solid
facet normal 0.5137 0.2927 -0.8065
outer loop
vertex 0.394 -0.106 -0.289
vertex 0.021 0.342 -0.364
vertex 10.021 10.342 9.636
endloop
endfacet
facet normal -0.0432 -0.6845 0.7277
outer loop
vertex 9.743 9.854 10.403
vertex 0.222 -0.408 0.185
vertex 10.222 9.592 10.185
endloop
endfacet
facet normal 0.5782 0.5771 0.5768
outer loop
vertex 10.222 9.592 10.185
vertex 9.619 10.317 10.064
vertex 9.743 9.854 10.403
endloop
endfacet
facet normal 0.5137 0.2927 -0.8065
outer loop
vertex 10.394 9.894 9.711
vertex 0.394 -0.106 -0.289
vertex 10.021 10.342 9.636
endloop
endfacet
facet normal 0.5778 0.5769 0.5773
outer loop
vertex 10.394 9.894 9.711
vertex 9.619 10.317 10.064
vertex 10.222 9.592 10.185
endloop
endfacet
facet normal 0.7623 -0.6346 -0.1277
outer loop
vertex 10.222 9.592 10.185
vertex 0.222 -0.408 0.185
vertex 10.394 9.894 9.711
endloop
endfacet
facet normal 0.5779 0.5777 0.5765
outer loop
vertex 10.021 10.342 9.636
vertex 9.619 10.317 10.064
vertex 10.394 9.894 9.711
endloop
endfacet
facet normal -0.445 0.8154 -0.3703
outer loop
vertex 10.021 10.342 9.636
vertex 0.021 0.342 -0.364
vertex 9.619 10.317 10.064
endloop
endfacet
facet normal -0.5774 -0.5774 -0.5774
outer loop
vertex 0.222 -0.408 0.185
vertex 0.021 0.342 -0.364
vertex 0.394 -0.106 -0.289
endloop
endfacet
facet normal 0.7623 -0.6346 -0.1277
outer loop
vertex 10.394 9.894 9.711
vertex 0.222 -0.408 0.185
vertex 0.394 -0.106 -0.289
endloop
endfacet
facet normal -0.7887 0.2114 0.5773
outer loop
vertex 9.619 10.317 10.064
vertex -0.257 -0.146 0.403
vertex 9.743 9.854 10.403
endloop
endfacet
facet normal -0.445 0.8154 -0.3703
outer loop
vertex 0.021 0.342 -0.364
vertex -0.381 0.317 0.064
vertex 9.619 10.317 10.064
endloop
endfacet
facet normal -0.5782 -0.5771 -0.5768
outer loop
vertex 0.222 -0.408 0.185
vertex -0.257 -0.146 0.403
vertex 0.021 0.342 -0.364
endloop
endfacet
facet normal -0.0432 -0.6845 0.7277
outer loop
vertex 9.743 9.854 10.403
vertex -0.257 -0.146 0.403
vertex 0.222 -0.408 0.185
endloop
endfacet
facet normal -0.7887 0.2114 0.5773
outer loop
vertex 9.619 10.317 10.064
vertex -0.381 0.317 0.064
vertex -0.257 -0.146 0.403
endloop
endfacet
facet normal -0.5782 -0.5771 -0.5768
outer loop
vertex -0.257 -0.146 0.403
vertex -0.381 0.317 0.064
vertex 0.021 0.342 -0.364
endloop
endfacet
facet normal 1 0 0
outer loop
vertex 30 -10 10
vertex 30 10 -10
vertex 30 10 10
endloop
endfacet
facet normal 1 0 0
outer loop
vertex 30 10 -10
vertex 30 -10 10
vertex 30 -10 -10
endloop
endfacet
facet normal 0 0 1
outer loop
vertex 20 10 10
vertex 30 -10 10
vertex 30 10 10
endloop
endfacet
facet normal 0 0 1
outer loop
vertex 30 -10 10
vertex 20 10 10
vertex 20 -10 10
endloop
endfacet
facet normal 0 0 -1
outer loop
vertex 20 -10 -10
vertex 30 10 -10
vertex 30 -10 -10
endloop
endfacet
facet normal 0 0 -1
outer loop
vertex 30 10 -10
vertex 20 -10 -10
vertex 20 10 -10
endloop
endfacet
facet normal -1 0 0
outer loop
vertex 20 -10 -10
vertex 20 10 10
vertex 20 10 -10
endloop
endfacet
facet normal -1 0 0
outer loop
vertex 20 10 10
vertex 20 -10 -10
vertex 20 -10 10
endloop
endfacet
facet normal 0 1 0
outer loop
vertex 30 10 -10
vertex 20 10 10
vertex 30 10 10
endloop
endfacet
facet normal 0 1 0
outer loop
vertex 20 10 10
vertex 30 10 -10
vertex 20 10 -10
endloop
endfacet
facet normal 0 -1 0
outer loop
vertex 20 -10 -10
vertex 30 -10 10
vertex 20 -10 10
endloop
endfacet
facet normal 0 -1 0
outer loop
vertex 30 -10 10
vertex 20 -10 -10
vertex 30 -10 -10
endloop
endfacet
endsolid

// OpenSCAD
union() {
	color(alpha = 1.0000000000, c = "gray") {
		translate(v = [5.,5.,5.]) {
			rotate(a = 54.735610317245346, v = [-10.0, 10.0, 0]) {
				cylinder(center = true, h = 17.320508075688775, r = 0.5000000000);
			}
		}
	}
	color(alpha = 1.0000000000, c = "blue") {
		translate(v = [20.0000000000, -10.0000000000, -10.0000000000]) {
			cube(center = false, size = [10.0000000000, 20.0000000000, 20.0000000000]);
		}
	}
}
